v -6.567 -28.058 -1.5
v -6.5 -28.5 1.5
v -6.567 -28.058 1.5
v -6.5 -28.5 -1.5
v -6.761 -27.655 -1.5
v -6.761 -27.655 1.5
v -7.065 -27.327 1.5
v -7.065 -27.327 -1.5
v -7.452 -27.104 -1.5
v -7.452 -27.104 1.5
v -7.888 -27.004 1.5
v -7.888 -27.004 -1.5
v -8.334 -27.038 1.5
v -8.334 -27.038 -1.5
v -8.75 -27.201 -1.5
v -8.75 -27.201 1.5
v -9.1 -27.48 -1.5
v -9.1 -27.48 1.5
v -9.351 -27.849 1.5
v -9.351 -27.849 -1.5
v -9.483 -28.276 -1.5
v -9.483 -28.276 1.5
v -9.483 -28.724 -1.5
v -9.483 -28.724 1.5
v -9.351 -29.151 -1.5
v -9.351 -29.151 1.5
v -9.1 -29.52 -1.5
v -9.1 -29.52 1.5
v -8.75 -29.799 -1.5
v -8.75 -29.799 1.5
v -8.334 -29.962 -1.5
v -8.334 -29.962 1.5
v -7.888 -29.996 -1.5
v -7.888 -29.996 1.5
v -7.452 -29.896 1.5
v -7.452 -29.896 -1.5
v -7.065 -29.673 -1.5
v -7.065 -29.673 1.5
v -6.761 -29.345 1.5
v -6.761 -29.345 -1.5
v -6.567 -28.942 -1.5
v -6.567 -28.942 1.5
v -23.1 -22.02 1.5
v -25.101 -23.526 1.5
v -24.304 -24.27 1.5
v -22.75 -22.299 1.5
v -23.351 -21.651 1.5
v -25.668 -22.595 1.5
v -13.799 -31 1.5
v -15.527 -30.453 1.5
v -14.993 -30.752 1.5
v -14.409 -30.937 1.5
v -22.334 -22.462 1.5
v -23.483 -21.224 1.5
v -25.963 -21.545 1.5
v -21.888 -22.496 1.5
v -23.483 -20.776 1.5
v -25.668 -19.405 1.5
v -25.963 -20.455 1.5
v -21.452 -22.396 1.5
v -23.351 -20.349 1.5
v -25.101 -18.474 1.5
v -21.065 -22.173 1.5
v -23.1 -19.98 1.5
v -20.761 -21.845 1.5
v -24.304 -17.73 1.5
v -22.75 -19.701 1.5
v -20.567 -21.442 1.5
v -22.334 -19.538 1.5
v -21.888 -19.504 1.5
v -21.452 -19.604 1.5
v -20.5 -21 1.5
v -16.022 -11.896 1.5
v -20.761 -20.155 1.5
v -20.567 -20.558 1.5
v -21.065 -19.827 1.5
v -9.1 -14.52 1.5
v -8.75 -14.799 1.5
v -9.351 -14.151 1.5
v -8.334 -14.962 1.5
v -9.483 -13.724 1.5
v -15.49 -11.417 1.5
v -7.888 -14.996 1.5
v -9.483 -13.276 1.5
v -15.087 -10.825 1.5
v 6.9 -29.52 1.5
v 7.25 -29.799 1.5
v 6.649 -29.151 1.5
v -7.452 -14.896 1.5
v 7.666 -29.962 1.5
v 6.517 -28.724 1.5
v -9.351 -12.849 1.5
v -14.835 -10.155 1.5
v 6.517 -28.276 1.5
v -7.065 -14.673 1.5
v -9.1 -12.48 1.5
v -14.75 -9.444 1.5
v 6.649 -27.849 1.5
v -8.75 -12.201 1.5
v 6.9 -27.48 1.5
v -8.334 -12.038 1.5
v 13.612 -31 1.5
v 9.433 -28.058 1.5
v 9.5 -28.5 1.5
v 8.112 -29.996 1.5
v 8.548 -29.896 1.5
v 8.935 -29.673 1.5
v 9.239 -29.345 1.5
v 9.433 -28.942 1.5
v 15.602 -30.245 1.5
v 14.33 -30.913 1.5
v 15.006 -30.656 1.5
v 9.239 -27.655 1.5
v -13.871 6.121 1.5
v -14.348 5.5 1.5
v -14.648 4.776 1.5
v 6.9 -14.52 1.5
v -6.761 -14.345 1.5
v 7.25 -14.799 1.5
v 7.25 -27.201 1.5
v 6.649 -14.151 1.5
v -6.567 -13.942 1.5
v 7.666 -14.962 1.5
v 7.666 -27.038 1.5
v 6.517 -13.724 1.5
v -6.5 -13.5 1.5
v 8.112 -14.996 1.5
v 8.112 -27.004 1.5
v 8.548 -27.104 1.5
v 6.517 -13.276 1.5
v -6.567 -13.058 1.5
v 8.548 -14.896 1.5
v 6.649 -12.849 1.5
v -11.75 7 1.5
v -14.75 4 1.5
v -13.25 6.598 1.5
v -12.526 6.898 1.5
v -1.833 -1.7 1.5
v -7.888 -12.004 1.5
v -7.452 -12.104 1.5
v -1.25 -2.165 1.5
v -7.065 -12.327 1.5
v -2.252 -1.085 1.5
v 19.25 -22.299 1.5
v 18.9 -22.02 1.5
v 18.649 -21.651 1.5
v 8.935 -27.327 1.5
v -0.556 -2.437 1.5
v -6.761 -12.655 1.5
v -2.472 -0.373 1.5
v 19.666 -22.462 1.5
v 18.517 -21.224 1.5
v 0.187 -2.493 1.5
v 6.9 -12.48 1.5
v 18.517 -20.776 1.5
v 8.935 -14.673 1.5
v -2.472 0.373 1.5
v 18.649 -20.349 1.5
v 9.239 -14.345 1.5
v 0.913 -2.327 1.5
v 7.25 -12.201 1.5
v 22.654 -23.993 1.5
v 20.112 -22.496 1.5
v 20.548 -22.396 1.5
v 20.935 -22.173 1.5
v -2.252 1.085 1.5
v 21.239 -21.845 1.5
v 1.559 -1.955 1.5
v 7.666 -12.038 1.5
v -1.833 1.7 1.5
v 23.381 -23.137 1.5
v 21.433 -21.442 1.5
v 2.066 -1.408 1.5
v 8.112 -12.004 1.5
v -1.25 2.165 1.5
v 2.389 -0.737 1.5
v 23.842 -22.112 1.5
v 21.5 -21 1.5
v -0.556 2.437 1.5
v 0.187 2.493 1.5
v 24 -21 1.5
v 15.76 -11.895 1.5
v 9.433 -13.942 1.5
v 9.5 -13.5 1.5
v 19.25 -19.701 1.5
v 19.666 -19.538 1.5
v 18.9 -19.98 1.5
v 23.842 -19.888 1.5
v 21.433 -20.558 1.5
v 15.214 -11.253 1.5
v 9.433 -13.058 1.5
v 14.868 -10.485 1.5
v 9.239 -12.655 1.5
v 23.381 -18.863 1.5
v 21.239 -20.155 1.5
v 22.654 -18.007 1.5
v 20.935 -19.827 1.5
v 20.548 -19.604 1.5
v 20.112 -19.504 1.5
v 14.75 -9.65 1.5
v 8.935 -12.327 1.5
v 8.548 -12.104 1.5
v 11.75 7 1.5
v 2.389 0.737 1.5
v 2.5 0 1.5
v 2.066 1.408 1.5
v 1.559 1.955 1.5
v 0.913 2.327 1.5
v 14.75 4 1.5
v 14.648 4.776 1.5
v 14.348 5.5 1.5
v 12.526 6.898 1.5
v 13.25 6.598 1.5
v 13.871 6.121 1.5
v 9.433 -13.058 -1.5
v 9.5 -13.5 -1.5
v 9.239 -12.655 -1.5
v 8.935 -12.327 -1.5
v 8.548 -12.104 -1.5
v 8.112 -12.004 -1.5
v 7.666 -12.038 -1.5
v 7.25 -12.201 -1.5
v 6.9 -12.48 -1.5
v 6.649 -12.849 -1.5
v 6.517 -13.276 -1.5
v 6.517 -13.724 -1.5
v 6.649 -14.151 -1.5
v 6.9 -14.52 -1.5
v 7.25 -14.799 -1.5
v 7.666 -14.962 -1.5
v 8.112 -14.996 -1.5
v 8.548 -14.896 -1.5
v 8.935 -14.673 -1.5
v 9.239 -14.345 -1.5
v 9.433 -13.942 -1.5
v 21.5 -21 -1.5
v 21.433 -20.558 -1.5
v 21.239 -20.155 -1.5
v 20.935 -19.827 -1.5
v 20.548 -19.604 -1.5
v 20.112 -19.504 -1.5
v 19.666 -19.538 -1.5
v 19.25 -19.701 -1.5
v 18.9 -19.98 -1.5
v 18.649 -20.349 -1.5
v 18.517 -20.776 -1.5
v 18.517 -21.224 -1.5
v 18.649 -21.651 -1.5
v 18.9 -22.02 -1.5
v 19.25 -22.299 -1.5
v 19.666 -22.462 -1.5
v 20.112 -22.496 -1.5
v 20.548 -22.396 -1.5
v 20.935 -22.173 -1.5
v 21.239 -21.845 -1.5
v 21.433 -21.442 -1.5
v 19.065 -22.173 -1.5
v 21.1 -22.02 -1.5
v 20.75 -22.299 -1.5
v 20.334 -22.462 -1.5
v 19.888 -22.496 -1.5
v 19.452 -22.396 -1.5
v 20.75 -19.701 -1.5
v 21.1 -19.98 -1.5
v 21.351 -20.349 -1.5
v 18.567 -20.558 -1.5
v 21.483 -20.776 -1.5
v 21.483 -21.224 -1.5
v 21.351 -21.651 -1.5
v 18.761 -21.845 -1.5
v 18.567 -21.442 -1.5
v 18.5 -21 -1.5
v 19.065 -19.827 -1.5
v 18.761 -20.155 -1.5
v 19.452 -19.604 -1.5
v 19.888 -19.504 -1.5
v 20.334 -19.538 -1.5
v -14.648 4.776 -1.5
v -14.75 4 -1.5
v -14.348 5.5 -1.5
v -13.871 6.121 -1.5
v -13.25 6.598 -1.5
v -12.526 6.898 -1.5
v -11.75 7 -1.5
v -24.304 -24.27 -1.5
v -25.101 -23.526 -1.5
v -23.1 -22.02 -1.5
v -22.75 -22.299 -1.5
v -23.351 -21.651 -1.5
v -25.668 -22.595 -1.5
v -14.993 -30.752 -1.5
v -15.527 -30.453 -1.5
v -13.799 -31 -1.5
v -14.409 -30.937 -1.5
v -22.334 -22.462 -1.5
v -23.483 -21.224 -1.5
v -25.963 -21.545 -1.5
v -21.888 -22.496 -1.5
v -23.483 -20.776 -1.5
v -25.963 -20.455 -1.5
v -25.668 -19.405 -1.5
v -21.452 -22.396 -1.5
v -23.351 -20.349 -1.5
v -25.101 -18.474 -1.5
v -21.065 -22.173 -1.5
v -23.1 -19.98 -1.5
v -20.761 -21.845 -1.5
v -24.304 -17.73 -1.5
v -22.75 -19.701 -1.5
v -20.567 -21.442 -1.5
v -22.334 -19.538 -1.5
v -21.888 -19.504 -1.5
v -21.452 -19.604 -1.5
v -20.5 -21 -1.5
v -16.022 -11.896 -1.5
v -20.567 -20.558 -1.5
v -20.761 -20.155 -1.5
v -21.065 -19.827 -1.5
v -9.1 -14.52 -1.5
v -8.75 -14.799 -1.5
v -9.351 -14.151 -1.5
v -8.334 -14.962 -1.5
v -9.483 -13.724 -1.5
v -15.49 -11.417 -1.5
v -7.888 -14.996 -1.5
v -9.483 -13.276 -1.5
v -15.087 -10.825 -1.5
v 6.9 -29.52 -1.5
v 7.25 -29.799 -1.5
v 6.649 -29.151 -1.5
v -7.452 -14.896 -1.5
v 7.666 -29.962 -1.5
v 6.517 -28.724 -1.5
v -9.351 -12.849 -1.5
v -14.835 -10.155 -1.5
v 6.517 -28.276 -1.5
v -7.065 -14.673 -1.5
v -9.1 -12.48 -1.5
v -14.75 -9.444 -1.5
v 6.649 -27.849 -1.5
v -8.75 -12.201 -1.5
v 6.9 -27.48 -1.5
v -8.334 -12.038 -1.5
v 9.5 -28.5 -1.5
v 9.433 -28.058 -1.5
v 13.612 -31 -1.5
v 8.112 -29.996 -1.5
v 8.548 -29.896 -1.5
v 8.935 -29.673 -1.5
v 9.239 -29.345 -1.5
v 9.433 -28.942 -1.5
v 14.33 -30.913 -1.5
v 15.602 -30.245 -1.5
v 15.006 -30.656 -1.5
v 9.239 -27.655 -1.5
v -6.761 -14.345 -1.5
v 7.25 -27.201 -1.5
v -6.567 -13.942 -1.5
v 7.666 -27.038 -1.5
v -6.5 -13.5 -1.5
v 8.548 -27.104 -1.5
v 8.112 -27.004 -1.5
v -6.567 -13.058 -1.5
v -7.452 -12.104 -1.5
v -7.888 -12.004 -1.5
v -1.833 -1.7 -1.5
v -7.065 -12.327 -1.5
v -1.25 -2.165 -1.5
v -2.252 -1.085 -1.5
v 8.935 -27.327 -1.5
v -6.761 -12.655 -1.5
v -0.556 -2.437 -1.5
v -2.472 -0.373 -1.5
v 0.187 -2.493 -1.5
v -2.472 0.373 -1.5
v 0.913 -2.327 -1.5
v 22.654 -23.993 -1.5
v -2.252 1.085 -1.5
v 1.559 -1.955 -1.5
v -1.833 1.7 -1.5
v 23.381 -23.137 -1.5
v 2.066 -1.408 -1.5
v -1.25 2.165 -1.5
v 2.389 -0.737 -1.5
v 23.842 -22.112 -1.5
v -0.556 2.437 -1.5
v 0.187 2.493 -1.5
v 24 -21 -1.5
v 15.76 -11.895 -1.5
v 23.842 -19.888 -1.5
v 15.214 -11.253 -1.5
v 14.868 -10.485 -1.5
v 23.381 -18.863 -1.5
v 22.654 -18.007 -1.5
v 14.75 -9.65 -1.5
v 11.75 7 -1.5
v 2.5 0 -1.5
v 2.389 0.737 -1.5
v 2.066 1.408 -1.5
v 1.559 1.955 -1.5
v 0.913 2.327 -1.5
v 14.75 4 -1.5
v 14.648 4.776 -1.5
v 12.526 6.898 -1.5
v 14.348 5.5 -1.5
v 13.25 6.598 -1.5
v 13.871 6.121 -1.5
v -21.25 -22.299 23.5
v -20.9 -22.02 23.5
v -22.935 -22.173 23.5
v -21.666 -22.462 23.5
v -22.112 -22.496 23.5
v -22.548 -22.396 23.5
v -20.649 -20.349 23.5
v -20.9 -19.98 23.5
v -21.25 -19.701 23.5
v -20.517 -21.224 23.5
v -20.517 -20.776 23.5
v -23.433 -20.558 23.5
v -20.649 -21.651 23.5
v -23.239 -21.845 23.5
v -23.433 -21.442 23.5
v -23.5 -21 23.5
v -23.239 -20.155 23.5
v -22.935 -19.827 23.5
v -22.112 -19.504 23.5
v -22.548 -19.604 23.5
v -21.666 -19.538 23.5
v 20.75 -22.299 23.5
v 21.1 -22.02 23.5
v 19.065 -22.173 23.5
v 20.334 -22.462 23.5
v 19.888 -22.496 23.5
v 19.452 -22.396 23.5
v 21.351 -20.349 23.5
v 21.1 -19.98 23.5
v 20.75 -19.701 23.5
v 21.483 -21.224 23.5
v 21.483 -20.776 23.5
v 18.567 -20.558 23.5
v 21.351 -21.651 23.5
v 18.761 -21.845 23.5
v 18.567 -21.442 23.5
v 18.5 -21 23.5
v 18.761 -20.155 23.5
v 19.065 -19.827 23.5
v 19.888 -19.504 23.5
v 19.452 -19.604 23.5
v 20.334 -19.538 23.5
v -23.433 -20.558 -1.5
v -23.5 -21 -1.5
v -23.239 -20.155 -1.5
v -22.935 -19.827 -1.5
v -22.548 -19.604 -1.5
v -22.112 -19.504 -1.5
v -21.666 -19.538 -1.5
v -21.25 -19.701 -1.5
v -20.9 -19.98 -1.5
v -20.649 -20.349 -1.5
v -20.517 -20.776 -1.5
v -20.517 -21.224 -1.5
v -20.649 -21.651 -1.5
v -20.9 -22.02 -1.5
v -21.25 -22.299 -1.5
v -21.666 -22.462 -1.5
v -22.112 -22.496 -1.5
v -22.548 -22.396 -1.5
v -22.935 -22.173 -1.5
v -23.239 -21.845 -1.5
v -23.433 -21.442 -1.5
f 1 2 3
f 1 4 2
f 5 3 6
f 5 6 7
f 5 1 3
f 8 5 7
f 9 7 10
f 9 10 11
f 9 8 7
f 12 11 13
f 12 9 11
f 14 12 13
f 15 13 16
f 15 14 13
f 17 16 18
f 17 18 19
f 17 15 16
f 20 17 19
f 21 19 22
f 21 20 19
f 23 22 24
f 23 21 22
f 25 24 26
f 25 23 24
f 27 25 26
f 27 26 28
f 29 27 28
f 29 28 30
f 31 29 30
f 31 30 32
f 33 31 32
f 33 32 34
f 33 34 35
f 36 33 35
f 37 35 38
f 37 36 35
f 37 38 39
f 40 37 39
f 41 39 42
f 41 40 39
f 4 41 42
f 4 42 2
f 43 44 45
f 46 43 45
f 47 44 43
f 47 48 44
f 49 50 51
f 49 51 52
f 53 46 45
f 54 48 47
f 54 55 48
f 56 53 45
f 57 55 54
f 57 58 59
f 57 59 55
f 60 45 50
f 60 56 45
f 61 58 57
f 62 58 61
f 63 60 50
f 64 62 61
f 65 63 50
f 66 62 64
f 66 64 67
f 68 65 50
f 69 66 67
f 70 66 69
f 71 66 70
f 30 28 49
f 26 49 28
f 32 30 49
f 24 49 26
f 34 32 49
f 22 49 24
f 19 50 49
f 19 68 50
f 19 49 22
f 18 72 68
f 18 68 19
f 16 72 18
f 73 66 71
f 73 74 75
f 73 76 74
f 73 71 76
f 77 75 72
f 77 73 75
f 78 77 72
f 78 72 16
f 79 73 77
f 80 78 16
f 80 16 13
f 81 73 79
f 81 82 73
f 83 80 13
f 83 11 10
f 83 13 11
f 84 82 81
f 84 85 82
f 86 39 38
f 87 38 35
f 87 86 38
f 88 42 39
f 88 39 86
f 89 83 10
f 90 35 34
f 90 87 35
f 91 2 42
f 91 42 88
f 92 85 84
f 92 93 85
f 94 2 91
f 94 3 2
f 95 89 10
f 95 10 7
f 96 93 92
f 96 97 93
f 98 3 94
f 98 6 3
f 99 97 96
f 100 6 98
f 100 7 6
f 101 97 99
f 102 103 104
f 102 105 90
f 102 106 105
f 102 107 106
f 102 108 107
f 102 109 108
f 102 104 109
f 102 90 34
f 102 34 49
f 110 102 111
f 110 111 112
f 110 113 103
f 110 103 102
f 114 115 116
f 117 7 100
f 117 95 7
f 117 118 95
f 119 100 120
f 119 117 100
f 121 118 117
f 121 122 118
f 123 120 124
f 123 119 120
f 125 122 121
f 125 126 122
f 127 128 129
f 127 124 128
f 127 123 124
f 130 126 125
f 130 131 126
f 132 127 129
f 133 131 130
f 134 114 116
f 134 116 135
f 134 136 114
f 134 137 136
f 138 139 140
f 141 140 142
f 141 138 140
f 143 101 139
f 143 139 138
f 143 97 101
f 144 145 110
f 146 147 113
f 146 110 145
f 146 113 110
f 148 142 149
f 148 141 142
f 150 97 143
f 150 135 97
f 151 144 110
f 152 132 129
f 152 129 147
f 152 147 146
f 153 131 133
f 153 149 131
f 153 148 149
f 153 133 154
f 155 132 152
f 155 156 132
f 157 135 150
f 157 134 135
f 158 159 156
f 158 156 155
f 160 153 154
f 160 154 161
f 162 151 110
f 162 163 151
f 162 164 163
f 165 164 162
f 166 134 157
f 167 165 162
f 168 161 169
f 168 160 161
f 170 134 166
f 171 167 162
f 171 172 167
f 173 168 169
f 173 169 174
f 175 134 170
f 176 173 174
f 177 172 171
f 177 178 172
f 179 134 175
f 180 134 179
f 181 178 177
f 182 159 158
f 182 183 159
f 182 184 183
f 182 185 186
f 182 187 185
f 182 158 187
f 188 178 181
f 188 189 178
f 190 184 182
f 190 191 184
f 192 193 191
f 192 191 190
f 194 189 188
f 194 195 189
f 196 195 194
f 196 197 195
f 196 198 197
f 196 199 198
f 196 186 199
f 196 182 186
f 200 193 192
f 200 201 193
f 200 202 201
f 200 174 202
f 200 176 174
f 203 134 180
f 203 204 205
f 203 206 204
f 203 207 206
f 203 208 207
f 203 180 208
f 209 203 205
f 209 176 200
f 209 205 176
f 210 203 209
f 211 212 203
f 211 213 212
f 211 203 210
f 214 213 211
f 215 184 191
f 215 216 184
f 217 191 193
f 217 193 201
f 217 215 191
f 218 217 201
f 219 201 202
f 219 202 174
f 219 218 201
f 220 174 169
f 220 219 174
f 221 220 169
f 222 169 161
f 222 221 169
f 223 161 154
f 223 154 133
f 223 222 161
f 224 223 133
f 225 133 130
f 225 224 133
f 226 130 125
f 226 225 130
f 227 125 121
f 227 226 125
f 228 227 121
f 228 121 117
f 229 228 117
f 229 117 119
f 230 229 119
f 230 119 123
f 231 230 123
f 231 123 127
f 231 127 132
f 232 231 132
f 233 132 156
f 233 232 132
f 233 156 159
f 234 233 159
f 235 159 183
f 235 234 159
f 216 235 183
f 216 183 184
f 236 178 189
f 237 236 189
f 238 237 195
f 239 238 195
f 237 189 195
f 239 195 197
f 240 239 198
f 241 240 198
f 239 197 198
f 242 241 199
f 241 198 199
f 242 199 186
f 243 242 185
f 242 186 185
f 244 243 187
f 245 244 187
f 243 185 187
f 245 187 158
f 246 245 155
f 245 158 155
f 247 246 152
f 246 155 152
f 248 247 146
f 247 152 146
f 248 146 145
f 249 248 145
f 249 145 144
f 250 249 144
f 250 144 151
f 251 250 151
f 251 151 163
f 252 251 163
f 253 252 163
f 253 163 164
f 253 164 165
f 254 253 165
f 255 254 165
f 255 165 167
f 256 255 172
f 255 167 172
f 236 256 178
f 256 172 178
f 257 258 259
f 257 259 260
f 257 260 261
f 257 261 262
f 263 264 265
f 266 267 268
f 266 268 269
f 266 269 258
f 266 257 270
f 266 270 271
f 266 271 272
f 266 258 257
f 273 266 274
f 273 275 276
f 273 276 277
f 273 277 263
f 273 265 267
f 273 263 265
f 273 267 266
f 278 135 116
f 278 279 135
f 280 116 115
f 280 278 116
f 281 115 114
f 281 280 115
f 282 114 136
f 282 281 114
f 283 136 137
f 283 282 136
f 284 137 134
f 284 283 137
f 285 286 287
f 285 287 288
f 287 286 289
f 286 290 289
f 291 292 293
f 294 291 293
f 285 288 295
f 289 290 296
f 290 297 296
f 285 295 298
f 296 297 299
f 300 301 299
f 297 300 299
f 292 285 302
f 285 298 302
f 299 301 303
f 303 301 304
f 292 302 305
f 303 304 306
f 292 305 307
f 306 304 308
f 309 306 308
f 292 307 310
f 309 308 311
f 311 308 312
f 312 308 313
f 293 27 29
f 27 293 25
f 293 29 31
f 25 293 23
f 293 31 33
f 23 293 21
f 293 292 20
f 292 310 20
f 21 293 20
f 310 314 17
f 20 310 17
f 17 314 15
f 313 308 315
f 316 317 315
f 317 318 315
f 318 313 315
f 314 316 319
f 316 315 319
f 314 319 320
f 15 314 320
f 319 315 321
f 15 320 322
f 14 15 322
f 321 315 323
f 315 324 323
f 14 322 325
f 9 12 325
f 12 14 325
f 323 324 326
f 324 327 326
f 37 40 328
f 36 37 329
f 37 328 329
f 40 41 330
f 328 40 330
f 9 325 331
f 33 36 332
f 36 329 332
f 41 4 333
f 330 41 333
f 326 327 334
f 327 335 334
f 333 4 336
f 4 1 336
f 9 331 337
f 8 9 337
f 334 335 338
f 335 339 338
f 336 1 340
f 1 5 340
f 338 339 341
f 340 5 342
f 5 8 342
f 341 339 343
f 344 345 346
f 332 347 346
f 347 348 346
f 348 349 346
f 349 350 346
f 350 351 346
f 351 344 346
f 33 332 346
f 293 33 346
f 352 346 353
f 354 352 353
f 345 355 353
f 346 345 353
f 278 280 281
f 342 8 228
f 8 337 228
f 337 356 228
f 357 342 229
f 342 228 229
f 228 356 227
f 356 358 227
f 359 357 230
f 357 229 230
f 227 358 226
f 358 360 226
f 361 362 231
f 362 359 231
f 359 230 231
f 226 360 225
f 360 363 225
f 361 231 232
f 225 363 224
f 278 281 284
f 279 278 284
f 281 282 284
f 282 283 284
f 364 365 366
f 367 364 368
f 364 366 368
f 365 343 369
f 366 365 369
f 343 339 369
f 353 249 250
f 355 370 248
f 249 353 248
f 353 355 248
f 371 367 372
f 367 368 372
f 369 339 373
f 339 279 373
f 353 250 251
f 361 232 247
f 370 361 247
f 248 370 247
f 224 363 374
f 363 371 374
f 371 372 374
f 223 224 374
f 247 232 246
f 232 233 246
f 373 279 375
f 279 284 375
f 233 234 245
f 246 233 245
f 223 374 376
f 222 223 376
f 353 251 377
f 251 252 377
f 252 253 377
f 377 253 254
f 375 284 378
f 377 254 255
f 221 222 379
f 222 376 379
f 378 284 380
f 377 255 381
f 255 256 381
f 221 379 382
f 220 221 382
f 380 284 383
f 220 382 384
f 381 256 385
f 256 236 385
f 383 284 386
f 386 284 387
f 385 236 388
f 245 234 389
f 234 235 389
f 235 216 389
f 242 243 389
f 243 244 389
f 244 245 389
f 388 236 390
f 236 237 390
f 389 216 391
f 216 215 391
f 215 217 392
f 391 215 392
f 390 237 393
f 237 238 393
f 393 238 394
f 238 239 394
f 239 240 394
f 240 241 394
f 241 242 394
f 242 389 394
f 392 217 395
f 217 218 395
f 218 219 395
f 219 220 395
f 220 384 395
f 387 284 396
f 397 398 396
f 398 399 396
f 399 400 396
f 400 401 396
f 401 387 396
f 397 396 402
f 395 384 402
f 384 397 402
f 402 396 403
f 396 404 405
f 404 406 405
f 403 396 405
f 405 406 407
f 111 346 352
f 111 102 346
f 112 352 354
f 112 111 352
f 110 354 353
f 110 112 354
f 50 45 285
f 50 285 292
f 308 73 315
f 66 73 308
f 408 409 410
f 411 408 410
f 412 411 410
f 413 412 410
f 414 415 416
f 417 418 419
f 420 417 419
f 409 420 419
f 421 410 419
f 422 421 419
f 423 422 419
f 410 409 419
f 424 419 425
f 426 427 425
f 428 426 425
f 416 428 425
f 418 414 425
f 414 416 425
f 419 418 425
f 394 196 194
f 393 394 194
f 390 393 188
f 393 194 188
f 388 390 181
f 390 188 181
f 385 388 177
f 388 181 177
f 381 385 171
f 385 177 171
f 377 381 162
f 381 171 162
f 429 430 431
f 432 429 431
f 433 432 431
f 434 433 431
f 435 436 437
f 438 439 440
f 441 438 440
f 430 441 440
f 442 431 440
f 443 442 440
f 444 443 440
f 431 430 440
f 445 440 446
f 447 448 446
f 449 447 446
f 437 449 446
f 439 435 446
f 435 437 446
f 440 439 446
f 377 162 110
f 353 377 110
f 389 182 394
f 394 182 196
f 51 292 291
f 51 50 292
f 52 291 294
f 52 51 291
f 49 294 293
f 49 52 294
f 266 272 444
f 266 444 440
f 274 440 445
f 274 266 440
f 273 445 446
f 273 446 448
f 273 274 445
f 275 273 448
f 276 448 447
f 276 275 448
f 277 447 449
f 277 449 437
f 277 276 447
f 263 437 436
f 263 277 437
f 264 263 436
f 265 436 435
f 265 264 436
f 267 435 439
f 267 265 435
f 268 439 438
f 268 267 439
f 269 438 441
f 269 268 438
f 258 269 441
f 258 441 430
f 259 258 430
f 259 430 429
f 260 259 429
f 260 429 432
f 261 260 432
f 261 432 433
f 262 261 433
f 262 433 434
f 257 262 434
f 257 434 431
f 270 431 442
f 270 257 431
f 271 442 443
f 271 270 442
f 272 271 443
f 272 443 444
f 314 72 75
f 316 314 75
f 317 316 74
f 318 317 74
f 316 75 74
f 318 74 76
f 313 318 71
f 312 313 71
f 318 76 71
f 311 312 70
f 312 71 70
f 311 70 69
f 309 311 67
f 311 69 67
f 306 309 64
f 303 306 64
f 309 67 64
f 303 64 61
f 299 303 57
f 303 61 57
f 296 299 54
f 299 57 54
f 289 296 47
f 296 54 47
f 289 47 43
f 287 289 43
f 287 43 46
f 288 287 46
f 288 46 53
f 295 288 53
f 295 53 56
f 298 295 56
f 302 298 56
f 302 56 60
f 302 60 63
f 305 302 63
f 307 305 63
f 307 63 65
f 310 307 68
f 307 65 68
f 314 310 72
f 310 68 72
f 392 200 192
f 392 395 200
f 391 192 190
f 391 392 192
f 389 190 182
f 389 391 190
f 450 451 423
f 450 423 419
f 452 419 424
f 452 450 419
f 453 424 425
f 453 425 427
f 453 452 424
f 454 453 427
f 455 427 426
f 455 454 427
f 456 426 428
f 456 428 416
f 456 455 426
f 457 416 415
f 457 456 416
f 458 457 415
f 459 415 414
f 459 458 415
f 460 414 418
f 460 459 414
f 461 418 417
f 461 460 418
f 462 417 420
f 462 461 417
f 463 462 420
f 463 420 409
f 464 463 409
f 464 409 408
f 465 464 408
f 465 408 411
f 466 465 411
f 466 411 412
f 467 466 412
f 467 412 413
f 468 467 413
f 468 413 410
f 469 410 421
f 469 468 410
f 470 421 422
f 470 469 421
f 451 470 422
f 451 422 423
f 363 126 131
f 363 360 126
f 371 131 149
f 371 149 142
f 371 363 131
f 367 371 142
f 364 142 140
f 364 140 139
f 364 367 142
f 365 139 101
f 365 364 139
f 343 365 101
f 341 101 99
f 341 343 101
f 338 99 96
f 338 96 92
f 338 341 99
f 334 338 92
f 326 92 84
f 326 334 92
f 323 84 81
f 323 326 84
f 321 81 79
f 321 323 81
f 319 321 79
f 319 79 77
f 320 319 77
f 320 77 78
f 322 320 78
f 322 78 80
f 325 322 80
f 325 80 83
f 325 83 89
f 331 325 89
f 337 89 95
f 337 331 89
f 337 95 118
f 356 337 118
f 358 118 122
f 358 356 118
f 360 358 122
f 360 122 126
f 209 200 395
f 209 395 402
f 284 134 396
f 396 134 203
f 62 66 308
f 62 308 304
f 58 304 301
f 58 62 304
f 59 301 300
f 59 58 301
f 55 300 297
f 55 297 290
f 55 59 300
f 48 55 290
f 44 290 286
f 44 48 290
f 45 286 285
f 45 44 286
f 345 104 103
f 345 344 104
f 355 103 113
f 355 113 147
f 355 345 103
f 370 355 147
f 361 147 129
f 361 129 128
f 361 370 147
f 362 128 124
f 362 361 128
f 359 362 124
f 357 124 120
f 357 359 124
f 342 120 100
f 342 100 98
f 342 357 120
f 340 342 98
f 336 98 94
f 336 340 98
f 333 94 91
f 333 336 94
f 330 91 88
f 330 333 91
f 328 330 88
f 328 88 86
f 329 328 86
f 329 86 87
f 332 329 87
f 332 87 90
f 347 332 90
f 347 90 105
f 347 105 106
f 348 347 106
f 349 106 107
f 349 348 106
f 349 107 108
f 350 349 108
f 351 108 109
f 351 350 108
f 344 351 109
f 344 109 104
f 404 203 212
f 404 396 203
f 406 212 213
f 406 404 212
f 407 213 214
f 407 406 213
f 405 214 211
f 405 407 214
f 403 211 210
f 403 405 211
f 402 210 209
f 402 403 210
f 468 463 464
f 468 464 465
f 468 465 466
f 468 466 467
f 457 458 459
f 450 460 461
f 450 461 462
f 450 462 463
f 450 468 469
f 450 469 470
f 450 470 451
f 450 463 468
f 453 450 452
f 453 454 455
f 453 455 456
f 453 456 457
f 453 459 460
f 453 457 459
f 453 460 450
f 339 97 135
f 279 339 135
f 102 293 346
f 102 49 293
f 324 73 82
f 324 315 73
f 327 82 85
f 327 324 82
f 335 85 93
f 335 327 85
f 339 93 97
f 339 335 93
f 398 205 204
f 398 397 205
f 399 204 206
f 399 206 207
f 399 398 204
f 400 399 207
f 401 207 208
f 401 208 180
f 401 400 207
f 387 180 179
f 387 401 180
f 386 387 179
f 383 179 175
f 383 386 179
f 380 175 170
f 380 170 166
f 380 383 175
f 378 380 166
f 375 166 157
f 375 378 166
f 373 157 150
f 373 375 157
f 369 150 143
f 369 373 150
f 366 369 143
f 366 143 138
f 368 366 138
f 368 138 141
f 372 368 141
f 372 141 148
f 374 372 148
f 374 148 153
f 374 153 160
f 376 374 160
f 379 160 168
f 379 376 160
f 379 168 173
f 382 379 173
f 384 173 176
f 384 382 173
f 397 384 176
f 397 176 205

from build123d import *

# Parameters (mm, degrees)
SKETCH2_W             = 29.5
SKETCH2_H             = 38
SKETCH2_R             = 1.5
SKETCH2_R_2           = 2.5
BOSS_EXTRUDE1_DEPTH   = 1.5
SKETCH3_R             = 1.5
BOSS_EXTRUDE2_DEPTH   = 3
FILLET2_R             = 3
SKETCH4_R             = 1.5
BOSS_EXTRUDE3_DEPTH   = 25
BOSS_EXTRUDE3_2_DEPTH = 25


with BuildPart() as part:
    # Sketch2 → Boss-Extrude1 (new, symmetric)
    with BuildSketch(Plane.XY):
        with Locations((0, -12)):
            Rectangle(SKETCH2_W, SKETCH2_H)
        with Locations((-8, -13.5)):
            Circle(SKETCH2_R, mode=Mode.SUBTRACT)
        with Locations((8, -13.5)):
            Circle(SKETCH2_R, mode=Mode.SUBTRACT)
        with Locations((8, -28.5)):
            Circle(SKETCH2_R, mode=Mode.SUBTRACT)
        with Locations((-8, -28.5)):
            Circle(SKETCH2_R, mode=Mode.SUBTRACT)
        Circle(SKETCH2_R_2, mode=Mode.SUBTRACT)
    extrude(amount=BOSS_EXTRUDE1_DEPTH, both=True)

    # Sketch3 → Boss-Extrude2 (add)
    # profile 1 of 2: a face of its own
    with BuildSketch(Plane.XY.offset(1.5)):
        with BuildLine():
            Line((-24.303579423, -24.270095082), (-14.75, -31))
            Line((-14.75, -31), (-14.75, -11))
            Line((-14.75, -11), (-24.303579423, -17.729904918))
            ThreePointArc((-24.303579423, -17.729904918), (-26, -21), (-24.303579423, -24.270095082))
        make_face()
        with Locations((-22, -21)):
            Circle(SKETCH3_R, mode=Mode.SUBTRACT)
    # profile 2 of 2: a face of its own
    with BuildSketch(Plane.XY.offset(1.5)):
        with BuildLine():
            Line((22.653543192, -23.993110176), (14.75, -31))
            Line((14.75, -31), (14.75, -11))
            Line((14.75, -11), (22.653543192, -18.006889824))
            ThreePointArc((22.653543192, -18.006889824), (24, -21), (22.653543192, -23.993110176))
        make_face()
        with Locations((20, -21)):
            Circle(SKETCH3_R, mode=Mode.SUBTRACT)
    extrude(amount=-BOSS_EXTRUDE2_DEPTH)

    # Fillet2
    fillet2_edges = [part.edges().sort_by_distance(p)[0] for p in [
        (-14.75, -11, 0),
        (14.75, -11, 0),
        (-14.75, 7, 0),
        (14.75, 7, 0),
        (14.75, -31, 0),
        (-14.75, -31, 0),
    ]]
    fillet(fillet2_edges, radius=FILLET2_R)


with BuildPart() as body_2:
    # Sketch4 → Boss-Extrude3 (new body)
    with BuildSketch(Plane(origin=(0, 0, -1.5), x_dir=(-1, 0, 0), z_dir=(0, 0, -1))):
        with Locations((22, -21)):
            Circle(SKETCH4_R)
    extrude(amount=-BOSS_EXTRUDE3_DEPTH)


with BuildPart() as body_3:
    # Sketch4 → Boss-Extrude3 2 (new body)
    with BuildSketch(Plane(origin=(0, 0, -1.5), x_dir=(-1, 0, 0), z_dir=(0, 0, -1))):
        with Locations((-20, -21)):
            Circle(SKETCH4_R)
    extrude(amount=-BOSS_EXTRUDE3_2_DEPTH)


solid = Compound([part.part, body_2.part, body_3.part])
